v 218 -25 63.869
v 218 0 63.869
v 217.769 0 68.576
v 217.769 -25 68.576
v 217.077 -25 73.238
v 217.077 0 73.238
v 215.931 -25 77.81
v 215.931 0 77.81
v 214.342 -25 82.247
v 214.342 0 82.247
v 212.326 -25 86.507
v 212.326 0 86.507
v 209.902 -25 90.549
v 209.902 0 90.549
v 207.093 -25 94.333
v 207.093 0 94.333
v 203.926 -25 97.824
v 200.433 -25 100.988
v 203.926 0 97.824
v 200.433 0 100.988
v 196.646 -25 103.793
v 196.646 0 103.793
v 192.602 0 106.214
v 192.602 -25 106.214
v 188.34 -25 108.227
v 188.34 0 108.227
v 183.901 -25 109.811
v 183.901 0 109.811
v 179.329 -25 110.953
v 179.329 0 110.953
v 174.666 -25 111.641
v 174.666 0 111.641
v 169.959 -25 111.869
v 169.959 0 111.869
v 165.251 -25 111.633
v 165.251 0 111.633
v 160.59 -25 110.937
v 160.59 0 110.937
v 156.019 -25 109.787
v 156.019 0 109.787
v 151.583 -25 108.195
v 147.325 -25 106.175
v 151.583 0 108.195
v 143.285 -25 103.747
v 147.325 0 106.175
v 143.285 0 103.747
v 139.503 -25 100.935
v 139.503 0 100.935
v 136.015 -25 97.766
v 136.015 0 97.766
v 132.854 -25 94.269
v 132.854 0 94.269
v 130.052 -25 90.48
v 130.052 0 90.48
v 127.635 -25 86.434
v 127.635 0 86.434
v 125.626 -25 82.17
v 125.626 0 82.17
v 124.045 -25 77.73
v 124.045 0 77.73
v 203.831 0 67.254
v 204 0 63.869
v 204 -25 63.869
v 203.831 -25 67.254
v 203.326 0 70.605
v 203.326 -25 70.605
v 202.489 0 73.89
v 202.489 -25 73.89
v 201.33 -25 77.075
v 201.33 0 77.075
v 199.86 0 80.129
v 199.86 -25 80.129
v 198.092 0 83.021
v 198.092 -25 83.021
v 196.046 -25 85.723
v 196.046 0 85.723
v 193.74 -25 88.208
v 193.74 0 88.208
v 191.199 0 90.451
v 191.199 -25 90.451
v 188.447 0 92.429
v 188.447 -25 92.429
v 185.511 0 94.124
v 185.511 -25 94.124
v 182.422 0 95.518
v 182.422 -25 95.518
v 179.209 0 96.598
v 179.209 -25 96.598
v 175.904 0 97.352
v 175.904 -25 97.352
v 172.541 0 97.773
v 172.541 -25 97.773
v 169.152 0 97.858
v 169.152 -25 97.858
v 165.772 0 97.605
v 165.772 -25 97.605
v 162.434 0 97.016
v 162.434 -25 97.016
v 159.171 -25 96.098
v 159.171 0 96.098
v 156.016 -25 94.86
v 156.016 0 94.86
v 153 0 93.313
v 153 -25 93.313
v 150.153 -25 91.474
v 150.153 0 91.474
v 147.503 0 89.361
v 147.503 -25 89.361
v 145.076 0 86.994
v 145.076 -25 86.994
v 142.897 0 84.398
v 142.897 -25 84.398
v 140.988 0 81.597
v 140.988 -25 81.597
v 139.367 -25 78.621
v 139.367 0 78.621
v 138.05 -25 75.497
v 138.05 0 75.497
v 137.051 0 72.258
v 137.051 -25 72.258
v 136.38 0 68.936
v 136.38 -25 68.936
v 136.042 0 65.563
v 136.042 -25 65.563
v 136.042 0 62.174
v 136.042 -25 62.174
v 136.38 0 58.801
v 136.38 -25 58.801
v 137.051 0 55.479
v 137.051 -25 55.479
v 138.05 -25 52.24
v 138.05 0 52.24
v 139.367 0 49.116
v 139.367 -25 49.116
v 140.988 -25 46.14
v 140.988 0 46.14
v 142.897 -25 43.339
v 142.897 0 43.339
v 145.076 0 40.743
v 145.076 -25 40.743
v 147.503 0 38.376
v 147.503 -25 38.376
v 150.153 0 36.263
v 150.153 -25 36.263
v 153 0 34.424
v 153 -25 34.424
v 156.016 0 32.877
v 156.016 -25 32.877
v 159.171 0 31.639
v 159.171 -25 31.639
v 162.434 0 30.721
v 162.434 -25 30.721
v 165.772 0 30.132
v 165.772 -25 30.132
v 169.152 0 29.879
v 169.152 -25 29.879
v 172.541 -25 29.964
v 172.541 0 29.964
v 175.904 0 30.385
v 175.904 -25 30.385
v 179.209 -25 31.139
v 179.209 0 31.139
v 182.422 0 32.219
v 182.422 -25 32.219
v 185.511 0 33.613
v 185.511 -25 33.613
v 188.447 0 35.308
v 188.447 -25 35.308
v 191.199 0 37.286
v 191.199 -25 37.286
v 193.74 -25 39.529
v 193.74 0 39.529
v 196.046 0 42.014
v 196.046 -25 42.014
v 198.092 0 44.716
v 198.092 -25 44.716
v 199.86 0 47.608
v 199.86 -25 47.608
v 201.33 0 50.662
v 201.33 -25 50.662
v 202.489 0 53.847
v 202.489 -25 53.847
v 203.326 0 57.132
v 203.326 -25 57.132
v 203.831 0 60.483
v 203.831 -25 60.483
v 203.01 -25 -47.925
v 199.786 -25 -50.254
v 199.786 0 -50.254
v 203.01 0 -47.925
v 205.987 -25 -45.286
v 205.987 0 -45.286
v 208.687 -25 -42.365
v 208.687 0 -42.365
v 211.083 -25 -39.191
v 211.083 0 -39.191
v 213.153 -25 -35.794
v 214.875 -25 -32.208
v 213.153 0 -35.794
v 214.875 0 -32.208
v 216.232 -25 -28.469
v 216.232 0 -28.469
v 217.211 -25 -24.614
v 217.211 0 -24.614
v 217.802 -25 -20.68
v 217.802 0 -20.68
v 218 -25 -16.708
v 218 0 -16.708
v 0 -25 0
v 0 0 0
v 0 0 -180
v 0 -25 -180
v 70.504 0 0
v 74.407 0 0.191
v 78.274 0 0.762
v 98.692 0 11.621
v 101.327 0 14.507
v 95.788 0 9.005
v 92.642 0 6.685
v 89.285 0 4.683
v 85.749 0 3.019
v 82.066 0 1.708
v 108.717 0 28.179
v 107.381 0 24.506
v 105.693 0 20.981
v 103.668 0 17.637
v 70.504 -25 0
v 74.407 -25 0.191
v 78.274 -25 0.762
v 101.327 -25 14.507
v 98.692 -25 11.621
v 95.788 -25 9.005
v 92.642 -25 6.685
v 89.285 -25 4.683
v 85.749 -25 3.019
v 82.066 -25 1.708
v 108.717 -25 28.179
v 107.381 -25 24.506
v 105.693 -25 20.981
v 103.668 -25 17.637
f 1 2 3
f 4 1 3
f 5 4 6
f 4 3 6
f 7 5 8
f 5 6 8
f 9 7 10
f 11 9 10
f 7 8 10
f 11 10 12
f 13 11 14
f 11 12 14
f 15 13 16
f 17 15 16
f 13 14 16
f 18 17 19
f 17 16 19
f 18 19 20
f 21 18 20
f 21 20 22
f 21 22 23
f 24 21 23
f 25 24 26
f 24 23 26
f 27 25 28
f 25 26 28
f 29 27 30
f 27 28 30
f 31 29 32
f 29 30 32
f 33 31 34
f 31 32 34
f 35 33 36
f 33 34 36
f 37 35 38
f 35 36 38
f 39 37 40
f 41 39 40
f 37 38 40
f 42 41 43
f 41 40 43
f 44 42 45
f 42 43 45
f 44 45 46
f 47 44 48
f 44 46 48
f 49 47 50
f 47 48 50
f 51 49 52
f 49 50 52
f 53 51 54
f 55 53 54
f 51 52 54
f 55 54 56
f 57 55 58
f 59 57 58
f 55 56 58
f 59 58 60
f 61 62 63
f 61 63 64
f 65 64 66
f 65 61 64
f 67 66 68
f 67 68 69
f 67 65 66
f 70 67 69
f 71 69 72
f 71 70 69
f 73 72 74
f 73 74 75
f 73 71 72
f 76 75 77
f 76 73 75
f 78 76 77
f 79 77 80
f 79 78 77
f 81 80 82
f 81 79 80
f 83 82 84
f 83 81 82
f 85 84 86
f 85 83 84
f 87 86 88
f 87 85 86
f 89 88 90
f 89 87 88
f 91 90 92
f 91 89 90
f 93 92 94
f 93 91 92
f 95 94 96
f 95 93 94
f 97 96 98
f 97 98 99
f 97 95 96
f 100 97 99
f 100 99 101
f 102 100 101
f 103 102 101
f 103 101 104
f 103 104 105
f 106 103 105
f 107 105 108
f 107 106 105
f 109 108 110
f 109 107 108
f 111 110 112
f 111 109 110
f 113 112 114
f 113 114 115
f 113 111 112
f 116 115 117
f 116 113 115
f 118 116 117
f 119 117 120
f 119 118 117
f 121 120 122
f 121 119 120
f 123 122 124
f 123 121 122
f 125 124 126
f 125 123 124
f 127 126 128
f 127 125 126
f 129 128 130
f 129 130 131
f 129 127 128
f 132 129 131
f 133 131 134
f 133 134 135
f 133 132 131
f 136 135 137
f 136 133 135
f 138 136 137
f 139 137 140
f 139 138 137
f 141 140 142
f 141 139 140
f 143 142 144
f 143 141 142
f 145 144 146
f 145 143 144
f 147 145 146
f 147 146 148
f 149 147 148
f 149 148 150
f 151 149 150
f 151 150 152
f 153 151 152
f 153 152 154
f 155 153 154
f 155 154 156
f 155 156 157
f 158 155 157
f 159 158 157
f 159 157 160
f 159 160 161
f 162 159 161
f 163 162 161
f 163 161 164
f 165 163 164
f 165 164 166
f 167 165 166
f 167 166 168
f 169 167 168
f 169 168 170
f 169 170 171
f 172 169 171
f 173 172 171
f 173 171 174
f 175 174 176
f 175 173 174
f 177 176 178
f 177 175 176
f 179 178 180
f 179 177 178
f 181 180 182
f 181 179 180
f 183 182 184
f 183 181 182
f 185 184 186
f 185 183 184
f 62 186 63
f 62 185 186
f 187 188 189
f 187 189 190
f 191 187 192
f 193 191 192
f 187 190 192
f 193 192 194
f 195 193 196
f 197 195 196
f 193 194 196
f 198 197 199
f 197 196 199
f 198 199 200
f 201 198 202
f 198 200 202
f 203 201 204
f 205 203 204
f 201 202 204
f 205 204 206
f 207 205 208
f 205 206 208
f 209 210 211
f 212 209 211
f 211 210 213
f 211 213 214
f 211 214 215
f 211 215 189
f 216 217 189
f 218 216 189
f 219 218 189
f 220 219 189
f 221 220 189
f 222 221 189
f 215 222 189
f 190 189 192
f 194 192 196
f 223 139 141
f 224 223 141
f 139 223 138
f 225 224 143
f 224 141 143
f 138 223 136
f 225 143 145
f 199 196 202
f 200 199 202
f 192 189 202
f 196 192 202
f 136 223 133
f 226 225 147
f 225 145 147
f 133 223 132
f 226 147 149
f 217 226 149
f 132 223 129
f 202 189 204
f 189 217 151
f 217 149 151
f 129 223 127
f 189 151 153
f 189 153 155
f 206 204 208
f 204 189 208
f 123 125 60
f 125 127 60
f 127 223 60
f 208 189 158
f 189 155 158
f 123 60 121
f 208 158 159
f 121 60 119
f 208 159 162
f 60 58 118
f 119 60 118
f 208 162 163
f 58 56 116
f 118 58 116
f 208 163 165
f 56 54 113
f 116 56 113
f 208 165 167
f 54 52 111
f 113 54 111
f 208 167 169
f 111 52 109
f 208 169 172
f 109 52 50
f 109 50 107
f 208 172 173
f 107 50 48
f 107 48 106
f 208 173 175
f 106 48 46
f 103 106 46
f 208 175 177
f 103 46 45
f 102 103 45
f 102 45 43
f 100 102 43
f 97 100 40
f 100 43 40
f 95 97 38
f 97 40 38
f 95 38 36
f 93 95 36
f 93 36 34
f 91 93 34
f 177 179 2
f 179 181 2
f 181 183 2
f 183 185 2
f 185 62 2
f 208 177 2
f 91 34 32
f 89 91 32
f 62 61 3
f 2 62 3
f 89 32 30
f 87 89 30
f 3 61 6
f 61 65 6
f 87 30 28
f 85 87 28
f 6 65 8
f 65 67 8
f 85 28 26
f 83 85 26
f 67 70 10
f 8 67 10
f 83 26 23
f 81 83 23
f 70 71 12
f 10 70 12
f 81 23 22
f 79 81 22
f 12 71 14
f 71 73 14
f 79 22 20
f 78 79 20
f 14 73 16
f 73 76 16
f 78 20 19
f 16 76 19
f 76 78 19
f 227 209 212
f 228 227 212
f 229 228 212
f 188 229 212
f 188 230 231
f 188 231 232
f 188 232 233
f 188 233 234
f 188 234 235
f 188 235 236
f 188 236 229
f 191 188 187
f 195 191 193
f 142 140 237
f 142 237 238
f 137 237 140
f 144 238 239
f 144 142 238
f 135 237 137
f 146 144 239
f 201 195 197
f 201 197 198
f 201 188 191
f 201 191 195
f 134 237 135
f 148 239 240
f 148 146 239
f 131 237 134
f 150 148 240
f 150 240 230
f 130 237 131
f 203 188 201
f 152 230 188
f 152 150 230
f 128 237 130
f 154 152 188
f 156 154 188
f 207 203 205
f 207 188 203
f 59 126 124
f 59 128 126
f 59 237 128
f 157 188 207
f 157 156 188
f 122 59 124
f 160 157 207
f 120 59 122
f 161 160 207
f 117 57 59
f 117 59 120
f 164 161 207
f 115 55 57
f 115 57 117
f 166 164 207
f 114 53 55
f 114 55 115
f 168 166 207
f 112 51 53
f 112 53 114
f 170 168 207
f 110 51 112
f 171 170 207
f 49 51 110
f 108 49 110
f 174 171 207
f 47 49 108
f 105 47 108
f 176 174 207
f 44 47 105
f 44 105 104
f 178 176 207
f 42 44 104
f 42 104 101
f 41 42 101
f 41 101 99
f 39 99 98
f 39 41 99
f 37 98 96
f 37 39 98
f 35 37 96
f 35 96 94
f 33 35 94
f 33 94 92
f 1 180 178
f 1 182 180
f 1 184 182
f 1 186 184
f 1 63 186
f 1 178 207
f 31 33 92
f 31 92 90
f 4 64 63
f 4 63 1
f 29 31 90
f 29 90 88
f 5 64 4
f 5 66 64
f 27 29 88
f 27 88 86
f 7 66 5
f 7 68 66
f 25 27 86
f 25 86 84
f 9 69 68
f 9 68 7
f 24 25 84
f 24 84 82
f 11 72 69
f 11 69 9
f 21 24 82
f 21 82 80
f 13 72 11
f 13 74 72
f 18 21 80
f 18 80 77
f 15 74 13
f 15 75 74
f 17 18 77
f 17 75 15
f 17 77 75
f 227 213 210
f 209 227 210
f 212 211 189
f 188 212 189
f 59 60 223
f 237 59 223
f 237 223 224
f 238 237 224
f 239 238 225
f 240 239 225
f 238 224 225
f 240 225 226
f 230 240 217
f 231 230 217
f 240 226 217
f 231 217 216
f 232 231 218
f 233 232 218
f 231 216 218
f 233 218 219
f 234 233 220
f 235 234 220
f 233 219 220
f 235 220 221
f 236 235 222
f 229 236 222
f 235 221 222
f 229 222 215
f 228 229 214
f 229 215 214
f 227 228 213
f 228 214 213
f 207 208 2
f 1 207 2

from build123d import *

# Parameters (mm, degrees)
F0_R     = 34
F1_DEPTH = 25
F2_DEPTH = 25


with BuildPart() as f1:
    # F0 (on Front) → F1 (new body)
    with BuildSketch(Plane.XZ):
        with BuildLine():
            Line((70.503501, 0), (0, 0))
            Line((0, 0), (0, -180))
            Line((0, -180), (199.785951, -50.254189))
            ThreePointArc((199.785951, -50.254189), (213.152795, -35.793765), (218, -16.707619))
            Line((218, -16.707619), (218, 63.868526))
            ThreePointArc((218, 63.868526), (162.994118, 16.382553), (124.045099, 77.730239))
            Line((124.045099, 77.730239), (108.716917, 28.179049))
            ThreePointArc((108.716917, 28.179049), (94.243362, 7.806538), (70.503501, 0))
        make_face()
        with BuildLine():
            ThreePointArc((218, 63.868526), (177.005882, 111.354498), (124.045099, 77.730239))
            ThreePointArc((124.045099, 77.730239), (162.994118, 16.382553), (218, 63.868526))
        make_face()
        with Locations((170, 63.868526)):
            Circle(F0_R, mode=Mode.SUBTRACT)
    extrude(amount=F1_DEPTH)

    # F0 (on Front) → F2 (join)
    with BuildSketch(Plane.XZ):
        with BuildLine():
            Line((70.503501, 0), (0, 0))
            Line((0, 0), (0, -180))
            Line((0, -180), (199.785951, -50.254189))
            ThreePointArc((199.785951, -50.254189), (213.152795, -35.793765), (218, -16.707619))
            Line((218, -16.707619), (218, 63.868526))
            ThreePointArc((218, 63.868526), (162.994118, 16.382553), (124.045099, 77.730239))
            Line((124.045099, 77.730239), (108.716917, 28.179049))
            ThreePointArc((108.716917, 28.179049), (94.243362, 7.806538), (70.503501, 0))
        make_face()
        with BuildLine():
            ThreePointArc((218, 63.868526), (177.005882, 111.354498), (124.045099, 77.730239))
            ThreePointArc((124.045099, 77.730239), (162.994118, 16.382553), (218, 63.868526))
        make_face()
        with Locations((170, 63.868526)):
            Circle(F0_R, mode=Mode.SUBTRACT)
    extrude(amount=F2_DEPTH)


solid = f1.part
